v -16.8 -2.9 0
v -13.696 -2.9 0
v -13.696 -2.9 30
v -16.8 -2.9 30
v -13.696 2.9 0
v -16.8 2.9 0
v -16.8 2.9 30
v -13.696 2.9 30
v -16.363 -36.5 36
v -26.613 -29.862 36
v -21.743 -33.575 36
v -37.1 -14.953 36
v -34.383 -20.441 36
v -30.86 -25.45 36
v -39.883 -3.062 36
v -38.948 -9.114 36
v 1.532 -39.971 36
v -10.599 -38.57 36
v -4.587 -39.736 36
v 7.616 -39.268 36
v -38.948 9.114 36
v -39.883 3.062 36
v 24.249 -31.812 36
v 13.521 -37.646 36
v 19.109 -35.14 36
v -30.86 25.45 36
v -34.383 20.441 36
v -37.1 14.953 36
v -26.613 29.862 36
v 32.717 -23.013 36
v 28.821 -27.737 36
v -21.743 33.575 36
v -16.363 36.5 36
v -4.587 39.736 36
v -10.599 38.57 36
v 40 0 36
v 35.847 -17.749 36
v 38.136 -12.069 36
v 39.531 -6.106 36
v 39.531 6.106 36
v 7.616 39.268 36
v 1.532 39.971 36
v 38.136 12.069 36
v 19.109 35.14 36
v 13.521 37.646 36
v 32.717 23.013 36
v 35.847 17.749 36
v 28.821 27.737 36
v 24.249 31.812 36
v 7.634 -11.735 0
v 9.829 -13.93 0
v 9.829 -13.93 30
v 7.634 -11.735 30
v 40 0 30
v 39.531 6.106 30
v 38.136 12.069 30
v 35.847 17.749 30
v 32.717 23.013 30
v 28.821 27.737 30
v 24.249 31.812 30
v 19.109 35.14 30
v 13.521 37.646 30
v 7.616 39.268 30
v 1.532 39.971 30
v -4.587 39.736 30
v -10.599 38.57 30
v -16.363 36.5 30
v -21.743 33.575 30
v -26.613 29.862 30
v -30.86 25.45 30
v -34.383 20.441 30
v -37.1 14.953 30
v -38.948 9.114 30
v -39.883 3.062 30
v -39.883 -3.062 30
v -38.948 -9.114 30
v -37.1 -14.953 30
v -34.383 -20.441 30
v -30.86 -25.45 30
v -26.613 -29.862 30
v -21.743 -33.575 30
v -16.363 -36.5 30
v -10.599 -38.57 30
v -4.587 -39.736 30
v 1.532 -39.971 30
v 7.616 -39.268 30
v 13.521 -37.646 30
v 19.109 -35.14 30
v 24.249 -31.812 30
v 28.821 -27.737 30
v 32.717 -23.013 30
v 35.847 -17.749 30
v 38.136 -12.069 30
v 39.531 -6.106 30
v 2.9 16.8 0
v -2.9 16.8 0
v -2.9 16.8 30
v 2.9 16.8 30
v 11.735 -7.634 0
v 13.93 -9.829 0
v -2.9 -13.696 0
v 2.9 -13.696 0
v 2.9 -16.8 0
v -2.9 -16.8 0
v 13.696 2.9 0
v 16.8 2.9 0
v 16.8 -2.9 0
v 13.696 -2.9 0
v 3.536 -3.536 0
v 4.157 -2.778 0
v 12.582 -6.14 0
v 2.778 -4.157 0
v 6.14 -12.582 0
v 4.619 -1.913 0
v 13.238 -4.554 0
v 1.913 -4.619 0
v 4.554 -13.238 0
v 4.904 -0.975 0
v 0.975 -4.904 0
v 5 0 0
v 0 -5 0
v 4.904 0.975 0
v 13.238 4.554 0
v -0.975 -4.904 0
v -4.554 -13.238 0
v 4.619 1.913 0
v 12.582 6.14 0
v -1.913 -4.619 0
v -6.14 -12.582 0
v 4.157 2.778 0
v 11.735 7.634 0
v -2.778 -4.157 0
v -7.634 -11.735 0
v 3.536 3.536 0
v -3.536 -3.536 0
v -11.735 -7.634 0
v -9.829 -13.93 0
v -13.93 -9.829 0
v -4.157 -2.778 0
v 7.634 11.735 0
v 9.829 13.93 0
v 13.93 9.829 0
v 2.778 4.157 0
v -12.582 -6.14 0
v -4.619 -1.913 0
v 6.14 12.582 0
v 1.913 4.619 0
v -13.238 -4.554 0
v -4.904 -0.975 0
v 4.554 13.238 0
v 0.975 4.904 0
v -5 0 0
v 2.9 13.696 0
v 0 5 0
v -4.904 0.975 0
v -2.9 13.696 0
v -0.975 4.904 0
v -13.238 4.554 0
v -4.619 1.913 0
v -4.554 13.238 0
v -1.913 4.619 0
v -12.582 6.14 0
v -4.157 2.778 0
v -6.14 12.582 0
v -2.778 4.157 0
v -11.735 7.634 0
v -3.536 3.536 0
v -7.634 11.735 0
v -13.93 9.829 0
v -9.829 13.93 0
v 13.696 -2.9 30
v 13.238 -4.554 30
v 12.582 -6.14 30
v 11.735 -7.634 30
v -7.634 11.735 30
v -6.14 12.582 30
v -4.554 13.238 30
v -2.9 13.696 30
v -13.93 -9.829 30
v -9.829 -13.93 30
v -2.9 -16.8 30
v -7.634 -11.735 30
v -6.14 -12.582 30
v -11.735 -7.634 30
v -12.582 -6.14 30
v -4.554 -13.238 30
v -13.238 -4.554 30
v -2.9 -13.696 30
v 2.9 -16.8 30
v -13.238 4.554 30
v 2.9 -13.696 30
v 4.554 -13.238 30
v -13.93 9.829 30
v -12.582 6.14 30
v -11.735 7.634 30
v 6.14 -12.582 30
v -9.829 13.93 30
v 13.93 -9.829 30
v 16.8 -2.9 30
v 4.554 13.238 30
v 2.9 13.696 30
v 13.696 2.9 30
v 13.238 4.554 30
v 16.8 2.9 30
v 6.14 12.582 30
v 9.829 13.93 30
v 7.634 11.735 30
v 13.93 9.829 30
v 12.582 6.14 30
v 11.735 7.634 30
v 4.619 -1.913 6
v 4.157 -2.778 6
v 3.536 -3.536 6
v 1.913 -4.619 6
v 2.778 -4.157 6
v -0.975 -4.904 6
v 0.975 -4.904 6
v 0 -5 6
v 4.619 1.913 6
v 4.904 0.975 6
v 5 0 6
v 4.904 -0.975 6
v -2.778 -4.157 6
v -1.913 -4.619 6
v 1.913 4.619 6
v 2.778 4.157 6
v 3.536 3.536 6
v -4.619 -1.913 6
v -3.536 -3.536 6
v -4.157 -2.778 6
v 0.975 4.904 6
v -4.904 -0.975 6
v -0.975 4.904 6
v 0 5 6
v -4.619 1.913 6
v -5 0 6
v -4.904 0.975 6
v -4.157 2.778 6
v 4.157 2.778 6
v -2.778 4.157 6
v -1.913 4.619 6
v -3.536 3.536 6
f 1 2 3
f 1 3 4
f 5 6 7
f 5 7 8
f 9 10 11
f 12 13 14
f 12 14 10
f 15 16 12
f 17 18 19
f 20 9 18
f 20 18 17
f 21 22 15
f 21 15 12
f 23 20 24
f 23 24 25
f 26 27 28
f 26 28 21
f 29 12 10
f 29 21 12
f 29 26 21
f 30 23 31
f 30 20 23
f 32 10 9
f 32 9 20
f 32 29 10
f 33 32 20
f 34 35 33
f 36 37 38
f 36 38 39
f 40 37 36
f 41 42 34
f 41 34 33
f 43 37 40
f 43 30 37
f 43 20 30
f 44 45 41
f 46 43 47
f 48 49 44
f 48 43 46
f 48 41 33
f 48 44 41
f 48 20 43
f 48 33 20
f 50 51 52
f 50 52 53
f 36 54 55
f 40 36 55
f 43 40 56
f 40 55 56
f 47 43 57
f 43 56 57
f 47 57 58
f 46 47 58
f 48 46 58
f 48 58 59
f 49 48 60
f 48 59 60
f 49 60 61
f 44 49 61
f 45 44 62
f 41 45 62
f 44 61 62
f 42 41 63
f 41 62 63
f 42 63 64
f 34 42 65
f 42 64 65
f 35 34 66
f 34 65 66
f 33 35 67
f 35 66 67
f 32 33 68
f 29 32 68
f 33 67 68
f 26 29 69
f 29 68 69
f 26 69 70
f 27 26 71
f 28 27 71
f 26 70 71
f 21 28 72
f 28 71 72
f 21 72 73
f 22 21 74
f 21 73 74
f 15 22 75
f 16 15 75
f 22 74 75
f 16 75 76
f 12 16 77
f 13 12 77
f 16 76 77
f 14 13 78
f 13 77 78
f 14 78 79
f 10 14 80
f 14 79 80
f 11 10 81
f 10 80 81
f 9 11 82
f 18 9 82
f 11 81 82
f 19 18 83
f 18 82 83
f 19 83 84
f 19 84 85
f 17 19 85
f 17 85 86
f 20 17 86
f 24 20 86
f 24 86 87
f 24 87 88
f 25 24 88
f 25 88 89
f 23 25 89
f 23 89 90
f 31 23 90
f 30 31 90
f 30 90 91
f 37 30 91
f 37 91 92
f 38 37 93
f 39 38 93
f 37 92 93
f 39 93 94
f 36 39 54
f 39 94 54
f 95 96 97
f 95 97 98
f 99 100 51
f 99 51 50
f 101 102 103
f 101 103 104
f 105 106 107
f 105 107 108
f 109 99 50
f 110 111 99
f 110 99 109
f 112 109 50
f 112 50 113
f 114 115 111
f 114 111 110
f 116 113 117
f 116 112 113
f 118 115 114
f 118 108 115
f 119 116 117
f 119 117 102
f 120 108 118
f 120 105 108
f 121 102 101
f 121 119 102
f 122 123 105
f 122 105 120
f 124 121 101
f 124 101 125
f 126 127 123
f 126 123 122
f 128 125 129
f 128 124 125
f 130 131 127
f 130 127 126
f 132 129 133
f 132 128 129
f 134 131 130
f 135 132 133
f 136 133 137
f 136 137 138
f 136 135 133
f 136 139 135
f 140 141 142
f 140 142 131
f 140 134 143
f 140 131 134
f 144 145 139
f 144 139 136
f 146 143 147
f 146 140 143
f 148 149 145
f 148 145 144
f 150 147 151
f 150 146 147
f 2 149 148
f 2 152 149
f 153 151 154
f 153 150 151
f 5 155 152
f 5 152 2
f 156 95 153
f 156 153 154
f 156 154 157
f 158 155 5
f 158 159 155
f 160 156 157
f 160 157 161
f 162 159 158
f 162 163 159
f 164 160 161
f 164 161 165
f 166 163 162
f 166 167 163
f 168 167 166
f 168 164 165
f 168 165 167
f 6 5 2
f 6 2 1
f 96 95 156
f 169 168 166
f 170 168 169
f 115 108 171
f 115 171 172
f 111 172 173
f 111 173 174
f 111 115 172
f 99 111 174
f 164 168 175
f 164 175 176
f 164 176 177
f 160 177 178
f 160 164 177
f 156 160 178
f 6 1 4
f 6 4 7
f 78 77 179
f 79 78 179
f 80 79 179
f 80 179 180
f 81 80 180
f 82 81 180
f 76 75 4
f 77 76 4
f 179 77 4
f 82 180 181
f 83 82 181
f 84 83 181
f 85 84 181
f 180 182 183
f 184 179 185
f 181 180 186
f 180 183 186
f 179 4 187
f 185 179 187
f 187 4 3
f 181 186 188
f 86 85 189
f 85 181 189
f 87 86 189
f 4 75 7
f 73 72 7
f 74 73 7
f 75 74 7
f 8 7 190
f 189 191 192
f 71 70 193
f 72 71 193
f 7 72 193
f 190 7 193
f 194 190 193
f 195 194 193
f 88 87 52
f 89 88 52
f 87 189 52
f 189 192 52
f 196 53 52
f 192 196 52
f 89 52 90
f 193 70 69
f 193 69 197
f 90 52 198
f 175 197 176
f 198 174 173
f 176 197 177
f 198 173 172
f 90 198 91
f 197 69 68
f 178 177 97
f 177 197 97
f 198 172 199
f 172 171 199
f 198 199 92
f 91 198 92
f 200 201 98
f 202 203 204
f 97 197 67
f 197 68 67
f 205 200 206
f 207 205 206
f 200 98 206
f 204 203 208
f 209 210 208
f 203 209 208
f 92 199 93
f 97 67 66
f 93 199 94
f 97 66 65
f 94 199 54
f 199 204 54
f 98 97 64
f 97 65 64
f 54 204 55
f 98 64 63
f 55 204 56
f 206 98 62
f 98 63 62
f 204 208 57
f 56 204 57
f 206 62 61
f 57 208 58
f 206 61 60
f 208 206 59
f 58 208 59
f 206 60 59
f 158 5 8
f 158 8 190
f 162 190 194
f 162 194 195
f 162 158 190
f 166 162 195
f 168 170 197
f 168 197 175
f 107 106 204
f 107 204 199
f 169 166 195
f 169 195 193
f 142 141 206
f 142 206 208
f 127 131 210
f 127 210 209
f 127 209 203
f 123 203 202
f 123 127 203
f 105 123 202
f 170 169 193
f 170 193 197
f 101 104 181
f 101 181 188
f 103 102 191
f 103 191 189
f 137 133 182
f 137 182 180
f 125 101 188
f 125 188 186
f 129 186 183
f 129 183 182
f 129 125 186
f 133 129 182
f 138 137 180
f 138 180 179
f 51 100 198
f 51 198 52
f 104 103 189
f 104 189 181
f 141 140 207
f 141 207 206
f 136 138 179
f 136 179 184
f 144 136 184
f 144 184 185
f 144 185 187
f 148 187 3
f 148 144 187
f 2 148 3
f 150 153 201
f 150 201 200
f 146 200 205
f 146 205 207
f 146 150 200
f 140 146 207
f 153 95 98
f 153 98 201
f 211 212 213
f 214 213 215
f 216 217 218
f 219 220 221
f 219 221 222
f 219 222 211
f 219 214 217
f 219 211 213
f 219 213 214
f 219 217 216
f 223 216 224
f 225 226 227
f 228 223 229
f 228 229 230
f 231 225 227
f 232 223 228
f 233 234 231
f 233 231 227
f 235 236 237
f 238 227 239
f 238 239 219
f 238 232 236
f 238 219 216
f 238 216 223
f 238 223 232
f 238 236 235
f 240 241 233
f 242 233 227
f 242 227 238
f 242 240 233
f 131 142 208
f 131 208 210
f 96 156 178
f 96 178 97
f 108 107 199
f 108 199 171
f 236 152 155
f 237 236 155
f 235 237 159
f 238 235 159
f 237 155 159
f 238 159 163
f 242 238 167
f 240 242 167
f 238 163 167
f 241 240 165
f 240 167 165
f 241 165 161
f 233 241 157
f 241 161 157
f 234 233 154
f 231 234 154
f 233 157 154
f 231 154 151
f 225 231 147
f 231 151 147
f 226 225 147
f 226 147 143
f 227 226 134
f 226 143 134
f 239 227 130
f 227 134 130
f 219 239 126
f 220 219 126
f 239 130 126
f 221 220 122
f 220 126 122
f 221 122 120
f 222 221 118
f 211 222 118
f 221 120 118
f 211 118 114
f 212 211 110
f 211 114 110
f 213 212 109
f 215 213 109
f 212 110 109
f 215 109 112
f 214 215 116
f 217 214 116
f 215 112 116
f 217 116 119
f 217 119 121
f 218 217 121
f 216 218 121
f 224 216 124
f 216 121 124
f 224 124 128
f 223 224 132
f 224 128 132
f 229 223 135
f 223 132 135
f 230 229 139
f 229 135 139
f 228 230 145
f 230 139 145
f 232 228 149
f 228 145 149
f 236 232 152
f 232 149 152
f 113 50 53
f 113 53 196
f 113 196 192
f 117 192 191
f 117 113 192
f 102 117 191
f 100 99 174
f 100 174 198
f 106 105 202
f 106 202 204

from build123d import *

# Parameters (mm, degrees)
BOSS_EXTRUDE1_DEPTH = 30
SKETCH2_R           = 5
CUT_EXTRUDE1_DEPTH  = 6
SKETCH3_R           = 40
BOSS_EXTRUDE2_DEPTH = 6


with BuildPart() as part:
    # Sketch1 → Boss-Extrude1 (new body)
    with BuildSketch(Plane.XY):
        with BuildLine():
            Line((-2.9, 13.696349879), (-2.9, 16.8))
            Line((-2.9, 16.8), (2.9, 16.8))
            Line((2.9, 16.8), (2.9, 13.696349879))
            ThreePointArc((2.9, 13.696349879), (5.357568053, 12.934313455), (7.634172211, 11.735391542))
            Line((7.634172211, 11.735391542), (9.828784258, 13.930003589))
            Line((9.828784258, 13.930003589), (13.930003589, 9.828784258))
            Line((13.930003589, 9.828784258), (11.735391542, 7.634172211))
            ThreePointArc((11.735391542, 7.634172211), (12.934313455, 5.357568053), (13.696349879, 2.9))
            Line((13.696349879, 2.9), (16.8, 2.9))
            Line((16.8, 2.9), (16.8, -2.9))
            Line((16.8, -2.9), (13.696349879, -2.9))
            ThreePointArc((13.696349879, -2.9), (12.934313455, -5.357568053), (11.735391542, -7.634172211))
            Line((11.735391542, -7.634172211), (13.930003589, -9.828784258))
            Line((13.930003589, -9.828784258), (9.828784258, -13.930003589))
            Line((9.828784258, -13.930003589), (7.634172211, -11.735391542))
            ThreePointArc((7.634172211, -11.735391542), (5.357568053, -12.934313455), (2.9, -13.696349879))
            Line((2.9, -13.696349879), (2.9, -16.8))
            Line((2.9, -16.8), (-2.9, -16.8))
            Line((-2.9, -16.8), (-2.9, -13.696349879))
            ThreePointArc((-2.9, -13.696349879), (-5.357568053, -12.934313455), (-7.634172211, -11.735391542))
            Line((-7.634172211, -11.735391542), (-9.828784258, -13.930003589))
            Line((-9.828784258, -13.930003589), (-13.930003589, -9.828784258))
            Line((-13.930003589, -9.828784258), (-11.735391542, -7.634172211))
            ThreePointArc((-11.735391542, -7.634172211), (-12.934313455, -5.357568053), (-13.696349879, -2.9))
            Line((-13.696349879, -2.9), (-16.8, -2.9))
            Line((-16.8, -2.9), (-16.8, 2.9))
            Line((-16.8, 2.9), (-13.696349879, 2.9))
            ThreePointArc((-13.696349879, 2.9), (-12.934313455, 5.357568053), (-11.735391542, 7.634172211))
            Line((-11.735391542, 7.634172211), (-13.930003589, 9.828784258))
            Line((-13.930003589, 9.828784258), (-9.828784258, 13.930003589))
            Line((-9.828784258, 13.930003589), (-7.634172211, 11.735391542))
            ThreePointArc((-7.634172211, 11.735391542), (-5.357568053, 12.934313455), (-2.9, 13.696349879))
        make_face()
    extrude(amount=BOSS_EXTRUDE1_DEPTH)

    # Sketch2 → Cut-Extrude1 (cut)
    with BuildSketch(Plane(origin=(0, 0, 0), x_dir=(-1, 0, 0), z_dir=(0, 0, -1))):
        Circle(SKETCH2_R)
    extrude(amount=-CUT_EXTRUDE1_DEPTH, mode=Mode.SUBTRACT)

    # Sketch3 → Boss-Extrude2 (add)
    with BuildSketch(Plane.XY.offset(30)):
        Circle(SKETCH3_R)
    extrude(amount=BOSS_EXTRUDE2_DEPTH)


solid = part.part
